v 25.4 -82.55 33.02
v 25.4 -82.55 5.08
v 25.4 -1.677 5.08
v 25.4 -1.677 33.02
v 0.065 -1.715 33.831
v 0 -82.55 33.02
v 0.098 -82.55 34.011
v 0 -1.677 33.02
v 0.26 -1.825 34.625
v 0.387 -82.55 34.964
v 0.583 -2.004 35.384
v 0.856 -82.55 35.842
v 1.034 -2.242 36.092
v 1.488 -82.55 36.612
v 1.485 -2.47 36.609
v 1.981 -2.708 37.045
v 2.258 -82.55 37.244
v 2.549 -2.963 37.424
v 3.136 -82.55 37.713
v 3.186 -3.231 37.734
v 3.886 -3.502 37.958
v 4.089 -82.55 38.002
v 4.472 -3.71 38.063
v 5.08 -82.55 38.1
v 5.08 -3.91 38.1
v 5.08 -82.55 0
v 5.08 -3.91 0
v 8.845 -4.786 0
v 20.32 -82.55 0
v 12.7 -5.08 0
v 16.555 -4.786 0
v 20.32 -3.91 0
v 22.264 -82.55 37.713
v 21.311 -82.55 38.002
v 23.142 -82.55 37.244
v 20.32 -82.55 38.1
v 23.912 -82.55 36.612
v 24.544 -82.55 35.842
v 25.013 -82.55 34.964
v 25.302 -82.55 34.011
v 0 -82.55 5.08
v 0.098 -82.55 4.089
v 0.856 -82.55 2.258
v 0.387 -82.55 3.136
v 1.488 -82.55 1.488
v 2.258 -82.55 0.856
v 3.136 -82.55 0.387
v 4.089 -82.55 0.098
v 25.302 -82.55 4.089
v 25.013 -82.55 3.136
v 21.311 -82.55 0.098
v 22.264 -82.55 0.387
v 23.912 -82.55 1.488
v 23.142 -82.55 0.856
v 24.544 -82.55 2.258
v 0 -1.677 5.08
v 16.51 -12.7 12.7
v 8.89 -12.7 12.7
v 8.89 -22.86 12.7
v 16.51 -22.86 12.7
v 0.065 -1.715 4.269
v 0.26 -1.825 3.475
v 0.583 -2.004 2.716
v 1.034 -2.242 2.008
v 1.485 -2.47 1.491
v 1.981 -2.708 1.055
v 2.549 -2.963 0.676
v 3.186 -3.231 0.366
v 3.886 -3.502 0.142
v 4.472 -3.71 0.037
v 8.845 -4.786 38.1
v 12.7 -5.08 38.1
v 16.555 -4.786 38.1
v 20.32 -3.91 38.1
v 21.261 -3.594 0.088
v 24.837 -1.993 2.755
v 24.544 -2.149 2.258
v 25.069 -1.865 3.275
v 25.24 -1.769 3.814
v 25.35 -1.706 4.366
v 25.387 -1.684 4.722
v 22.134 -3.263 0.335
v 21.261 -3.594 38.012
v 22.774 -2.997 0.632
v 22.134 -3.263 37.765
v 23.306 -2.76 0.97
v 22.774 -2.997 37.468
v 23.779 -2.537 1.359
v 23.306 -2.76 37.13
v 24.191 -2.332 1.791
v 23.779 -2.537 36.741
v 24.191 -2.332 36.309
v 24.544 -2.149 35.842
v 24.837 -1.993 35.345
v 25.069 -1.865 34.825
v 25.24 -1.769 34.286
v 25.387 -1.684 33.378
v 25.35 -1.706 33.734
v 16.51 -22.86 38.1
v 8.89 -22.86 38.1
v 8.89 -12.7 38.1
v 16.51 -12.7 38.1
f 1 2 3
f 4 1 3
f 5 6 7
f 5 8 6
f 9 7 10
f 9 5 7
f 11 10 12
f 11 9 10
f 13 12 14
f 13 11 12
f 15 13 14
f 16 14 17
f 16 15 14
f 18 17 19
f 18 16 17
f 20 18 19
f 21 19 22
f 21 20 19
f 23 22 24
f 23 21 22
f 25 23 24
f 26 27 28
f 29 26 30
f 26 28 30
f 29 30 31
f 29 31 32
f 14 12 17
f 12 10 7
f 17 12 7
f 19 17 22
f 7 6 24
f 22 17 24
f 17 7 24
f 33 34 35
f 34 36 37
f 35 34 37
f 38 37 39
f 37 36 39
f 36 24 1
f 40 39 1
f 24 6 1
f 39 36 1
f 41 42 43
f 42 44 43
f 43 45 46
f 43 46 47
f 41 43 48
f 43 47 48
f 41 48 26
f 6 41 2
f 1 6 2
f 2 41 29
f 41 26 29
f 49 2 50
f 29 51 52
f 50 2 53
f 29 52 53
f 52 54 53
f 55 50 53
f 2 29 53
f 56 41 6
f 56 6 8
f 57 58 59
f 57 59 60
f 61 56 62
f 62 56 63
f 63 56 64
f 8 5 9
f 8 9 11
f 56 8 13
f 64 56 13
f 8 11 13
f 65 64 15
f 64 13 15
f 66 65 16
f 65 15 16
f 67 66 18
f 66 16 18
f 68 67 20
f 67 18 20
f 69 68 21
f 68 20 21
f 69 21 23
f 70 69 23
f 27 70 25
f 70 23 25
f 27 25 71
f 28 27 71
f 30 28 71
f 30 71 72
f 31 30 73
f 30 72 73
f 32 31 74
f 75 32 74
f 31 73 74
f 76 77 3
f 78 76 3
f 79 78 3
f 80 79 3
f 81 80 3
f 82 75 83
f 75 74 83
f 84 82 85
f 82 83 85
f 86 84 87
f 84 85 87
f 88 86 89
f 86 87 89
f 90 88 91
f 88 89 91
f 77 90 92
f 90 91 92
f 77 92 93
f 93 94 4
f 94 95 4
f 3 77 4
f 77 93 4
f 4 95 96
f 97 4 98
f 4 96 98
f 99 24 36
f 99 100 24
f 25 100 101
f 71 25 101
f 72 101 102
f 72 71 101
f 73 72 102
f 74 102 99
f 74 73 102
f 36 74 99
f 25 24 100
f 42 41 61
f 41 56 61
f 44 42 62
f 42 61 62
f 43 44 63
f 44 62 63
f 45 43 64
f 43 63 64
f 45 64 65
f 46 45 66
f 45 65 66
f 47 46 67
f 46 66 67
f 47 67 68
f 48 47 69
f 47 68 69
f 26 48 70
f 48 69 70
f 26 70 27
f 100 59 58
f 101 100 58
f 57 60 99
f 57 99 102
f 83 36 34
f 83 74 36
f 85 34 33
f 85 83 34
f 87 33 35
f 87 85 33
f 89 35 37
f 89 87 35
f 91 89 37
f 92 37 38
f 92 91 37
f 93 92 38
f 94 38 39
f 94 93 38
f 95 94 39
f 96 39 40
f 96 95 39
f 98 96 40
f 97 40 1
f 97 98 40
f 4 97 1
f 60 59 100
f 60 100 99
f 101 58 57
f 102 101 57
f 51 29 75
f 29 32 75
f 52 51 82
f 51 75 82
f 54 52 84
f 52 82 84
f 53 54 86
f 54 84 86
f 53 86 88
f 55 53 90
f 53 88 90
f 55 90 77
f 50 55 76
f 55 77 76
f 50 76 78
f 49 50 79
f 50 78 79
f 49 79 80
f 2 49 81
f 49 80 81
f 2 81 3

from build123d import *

# Parameters (mm, degrees)
F0_W     = 25.4
F0_H     = 82.55
F1_DEPTH = 38.1
F3_DEPTH = 76.2
F4_W     = 7.62
F4_H     = 10.16
F5_DEPTH = 25.4
F6_R     = 5.08


with BuildPart() as f1:
    # F0 (on Top) → F1 (new body)
    with BuildSketch(Plane.XY):
        with Locations((12.7, -41.275)):
            Rectangle(F0_W, F0_H)
    extrude(amount=F1_DEPTH)

    # F2 (on face) → F3 (cut)
    with BuildSketch(Plane.XY.offset(38.1)):
        with BuildLine():
            ThreePointArc((25.4, -1.677045), (34.697045, 7.62), (38.1, 20.32))
            ThreePointArc((38.1, 20.32), (0, 42.317045), (0, -1.677045))
            Line((0, -1.677045), (0, 0))
            Line((0, 0), (25.4, 0))
            Line((25.4, 0), (25.4, -1.677045))
        make_face()
        with BuildLine():
            Line((0, 0), (0, -1.677045))
            ThreePointArc((0, -1.677045), (12.7, -5.08), (25.4, -1.677045))
            Line((25.4, -1.677045), (25.4, 0))
            Line((25.4, 0), (0, 0))
        make_face()
    extrude(amount=-F3_DEPTH, mode=Mode.SUBTRACT)

    # F4 (on face) → F5 (cut)
    with BuildSketch(Plane.XY.offset(38.1)):
        with Locations((12.7, -17.78)):
            Rectangle(F4_W, F4_H)
    extrude(amount=-F5_DEPTH, mode=Mode.SUBTRACT)

    # F6
    f6_edges = [f1.edges().sort_by_distance(p)[0] for p in [
        (0, -42.113523, 38.1),
        (0, -42.113523, 0),
        (25.4, -42.113523, 38.1),
        (25.4, -42.113523, 0),
    ]]
    fillet(f6_edges, radius=F6_R)


solid = f1.part
